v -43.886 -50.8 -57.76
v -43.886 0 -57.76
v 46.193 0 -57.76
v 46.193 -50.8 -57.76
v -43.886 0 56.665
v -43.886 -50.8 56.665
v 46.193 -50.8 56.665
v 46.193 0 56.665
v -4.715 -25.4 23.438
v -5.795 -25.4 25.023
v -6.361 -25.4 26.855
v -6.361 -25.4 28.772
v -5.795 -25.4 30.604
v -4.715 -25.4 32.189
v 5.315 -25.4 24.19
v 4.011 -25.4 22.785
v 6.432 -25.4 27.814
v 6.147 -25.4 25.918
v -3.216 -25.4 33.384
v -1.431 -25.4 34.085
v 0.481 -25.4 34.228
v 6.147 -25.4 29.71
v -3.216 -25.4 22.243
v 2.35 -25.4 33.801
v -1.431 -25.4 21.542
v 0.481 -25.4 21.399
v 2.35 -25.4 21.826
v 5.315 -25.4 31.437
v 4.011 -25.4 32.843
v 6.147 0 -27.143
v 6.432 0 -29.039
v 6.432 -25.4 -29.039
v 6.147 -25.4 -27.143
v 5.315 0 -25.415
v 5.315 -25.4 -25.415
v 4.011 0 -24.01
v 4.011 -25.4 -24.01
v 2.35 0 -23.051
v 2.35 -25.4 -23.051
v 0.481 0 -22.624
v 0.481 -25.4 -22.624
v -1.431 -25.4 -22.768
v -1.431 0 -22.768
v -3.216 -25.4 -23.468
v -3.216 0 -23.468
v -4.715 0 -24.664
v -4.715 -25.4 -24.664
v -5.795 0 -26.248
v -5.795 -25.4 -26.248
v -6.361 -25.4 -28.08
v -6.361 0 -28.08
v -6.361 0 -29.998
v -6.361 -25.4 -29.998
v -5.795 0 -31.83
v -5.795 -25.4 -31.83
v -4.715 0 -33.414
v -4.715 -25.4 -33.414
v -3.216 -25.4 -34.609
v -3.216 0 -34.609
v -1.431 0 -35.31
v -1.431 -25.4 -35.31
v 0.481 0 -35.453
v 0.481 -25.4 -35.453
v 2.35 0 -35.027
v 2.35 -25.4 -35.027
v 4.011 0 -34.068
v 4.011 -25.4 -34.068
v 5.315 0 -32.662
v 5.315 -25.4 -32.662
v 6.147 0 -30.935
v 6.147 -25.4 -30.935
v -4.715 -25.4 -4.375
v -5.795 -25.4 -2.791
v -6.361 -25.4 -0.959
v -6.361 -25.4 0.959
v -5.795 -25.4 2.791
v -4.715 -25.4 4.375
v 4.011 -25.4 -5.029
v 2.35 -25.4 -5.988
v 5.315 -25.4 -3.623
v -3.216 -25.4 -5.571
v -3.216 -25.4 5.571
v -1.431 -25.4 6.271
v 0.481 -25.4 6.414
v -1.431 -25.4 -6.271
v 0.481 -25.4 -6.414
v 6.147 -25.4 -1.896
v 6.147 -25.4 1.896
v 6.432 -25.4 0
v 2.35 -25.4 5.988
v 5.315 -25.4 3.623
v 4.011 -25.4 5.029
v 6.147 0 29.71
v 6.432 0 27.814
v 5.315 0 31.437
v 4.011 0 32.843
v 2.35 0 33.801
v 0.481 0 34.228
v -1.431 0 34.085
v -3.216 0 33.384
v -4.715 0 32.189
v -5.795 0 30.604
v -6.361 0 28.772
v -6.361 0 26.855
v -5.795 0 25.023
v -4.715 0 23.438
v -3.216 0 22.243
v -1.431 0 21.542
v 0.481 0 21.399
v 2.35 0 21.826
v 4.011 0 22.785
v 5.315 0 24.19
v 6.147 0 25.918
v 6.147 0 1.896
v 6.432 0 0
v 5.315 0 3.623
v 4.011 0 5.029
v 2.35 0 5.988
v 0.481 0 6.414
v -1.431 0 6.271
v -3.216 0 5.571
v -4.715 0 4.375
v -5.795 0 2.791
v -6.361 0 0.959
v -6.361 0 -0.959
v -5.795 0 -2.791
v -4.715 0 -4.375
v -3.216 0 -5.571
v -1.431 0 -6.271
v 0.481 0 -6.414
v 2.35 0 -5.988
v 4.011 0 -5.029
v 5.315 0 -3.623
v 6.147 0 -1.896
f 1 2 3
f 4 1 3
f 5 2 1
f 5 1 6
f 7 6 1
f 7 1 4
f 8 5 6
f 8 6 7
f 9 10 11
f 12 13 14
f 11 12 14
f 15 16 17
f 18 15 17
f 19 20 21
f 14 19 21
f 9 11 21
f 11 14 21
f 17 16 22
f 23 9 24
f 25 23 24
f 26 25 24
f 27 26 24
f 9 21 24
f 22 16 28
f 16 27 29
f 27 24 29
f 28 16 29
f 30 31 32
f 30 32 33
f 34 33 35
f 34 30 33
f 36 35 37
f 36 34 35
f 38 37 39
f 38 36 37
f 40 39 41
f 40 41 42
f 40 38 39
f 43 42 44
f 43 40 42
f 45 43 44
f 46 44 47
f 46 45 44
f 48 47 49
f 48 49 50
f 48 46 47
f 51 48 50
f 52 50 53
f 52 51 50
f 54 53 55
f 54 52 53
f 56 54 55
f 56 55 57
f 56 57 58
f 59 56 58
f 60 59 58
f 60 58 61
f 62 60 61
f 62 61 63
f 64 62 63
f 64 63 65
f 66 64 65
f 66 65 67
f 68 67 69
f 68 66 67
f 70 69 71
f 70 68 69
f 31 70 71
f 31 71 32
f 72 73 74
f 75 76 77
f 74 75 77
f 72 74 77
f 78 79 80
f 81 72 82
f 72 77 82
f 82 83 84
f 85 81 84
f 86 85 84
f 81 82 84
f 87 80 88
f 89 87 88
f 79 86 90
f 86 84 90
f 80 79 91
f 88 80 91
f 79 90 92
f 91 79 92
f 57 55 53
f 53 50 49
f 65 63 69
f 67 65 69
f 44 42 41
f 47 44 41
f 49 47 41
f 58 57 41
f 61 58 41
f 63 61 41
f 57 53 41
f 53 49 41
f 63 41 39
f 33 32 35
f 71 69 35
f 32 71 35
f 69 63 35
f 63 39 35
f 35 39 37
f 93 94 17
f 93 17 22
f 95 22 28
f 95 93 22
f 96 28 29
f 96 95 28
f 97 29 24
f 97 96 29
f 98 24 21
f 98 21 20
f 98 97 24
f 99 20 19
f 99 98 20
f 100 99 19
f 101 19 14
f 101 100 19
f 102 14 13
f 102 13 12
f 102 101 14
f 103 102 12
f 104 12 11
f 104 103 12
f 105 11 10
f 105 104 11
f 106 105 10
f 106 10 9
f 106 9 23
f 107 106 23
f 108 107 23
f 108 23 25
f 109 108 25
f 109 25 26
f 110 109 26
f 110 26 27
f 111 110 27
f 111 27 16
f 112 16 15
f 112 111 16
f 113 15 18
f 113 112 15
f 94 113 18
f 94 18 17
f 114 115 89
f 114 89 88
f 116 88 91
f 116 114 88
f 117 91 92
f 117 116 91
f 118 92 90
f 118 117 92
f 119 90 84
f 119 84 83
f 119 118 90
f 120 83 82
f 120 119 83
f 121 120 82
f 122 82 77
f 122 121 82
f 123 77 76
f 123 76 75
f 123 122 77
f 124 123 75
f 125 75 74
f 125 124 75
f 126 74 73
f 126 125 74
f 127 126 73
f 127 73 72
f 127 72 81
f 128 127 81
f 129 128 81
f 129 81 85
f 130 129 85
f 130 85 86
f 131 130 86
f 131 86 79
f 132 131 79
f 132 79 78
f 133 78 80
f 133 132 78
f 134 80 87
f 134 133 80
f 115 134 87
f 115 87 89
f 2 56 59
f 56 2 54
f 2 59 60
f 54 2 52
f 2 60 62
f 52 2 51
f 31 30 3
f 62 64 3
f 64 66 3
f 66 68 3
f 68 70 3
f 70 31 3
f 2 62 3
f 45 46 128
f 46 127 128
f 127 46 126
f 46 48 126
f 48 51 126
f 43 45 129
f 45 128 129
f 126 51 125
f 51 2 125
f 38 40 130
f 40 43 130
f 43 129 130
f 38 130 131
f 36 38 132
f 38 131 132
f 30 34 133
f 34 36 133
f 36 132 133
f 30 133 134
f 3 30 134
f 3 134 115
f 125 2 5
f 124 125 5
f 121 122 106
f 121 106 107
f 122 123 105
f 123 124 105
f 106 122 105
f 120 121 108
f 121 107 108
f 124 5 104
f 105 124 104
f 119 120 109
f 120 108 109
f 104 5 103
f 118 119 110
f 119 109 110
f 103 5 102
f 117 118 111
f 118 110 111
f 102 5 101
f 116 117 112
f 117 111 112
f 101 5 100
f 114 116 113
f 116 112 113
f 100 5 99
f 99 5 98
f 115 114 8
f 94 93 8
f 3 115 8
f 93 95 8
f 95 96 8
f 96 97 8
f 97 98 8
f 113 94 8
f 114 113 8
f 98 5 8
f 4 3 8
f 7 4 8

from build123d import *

# Parameters (mm, degrees)
F0_W          = 90.0792330503
F0_H          = 114.4249662757
F1_DEPTH      = 50.8
F2_R          = 6.4323639035
F3_DEPTH      = 50.8
F3_DEPTH_BACK = 25.4


with BuildPart() as f1:
    # F0 (on Front) → F1 (new body)
    with BuildSketch(Plane.XZ):
        with Locations((1.1534392834, -0.5476027727)):
            Rectangle(F0_W, F0_H)
    extrude(amount=F1_DEPTH)

    # F2 (on Front) → F3 (cut, two sides)
    with BuildSketch(Plane.XZ) as f3_sk:
        with Locations((0, 27.8135836124)):
            Circle(F2_R)
        Circle(F2_R)
        with Locations((0, -29.0388520807)):
            Circle(F2_R)
    extrude(amount=-F3_DEPTH, mode=Mode.SUBTRACT)
    extrude(f3_sk.sketch, amount=F3_DEPTH_BACK, mode=Mode.SUBTRACT)


solid = f1.part
